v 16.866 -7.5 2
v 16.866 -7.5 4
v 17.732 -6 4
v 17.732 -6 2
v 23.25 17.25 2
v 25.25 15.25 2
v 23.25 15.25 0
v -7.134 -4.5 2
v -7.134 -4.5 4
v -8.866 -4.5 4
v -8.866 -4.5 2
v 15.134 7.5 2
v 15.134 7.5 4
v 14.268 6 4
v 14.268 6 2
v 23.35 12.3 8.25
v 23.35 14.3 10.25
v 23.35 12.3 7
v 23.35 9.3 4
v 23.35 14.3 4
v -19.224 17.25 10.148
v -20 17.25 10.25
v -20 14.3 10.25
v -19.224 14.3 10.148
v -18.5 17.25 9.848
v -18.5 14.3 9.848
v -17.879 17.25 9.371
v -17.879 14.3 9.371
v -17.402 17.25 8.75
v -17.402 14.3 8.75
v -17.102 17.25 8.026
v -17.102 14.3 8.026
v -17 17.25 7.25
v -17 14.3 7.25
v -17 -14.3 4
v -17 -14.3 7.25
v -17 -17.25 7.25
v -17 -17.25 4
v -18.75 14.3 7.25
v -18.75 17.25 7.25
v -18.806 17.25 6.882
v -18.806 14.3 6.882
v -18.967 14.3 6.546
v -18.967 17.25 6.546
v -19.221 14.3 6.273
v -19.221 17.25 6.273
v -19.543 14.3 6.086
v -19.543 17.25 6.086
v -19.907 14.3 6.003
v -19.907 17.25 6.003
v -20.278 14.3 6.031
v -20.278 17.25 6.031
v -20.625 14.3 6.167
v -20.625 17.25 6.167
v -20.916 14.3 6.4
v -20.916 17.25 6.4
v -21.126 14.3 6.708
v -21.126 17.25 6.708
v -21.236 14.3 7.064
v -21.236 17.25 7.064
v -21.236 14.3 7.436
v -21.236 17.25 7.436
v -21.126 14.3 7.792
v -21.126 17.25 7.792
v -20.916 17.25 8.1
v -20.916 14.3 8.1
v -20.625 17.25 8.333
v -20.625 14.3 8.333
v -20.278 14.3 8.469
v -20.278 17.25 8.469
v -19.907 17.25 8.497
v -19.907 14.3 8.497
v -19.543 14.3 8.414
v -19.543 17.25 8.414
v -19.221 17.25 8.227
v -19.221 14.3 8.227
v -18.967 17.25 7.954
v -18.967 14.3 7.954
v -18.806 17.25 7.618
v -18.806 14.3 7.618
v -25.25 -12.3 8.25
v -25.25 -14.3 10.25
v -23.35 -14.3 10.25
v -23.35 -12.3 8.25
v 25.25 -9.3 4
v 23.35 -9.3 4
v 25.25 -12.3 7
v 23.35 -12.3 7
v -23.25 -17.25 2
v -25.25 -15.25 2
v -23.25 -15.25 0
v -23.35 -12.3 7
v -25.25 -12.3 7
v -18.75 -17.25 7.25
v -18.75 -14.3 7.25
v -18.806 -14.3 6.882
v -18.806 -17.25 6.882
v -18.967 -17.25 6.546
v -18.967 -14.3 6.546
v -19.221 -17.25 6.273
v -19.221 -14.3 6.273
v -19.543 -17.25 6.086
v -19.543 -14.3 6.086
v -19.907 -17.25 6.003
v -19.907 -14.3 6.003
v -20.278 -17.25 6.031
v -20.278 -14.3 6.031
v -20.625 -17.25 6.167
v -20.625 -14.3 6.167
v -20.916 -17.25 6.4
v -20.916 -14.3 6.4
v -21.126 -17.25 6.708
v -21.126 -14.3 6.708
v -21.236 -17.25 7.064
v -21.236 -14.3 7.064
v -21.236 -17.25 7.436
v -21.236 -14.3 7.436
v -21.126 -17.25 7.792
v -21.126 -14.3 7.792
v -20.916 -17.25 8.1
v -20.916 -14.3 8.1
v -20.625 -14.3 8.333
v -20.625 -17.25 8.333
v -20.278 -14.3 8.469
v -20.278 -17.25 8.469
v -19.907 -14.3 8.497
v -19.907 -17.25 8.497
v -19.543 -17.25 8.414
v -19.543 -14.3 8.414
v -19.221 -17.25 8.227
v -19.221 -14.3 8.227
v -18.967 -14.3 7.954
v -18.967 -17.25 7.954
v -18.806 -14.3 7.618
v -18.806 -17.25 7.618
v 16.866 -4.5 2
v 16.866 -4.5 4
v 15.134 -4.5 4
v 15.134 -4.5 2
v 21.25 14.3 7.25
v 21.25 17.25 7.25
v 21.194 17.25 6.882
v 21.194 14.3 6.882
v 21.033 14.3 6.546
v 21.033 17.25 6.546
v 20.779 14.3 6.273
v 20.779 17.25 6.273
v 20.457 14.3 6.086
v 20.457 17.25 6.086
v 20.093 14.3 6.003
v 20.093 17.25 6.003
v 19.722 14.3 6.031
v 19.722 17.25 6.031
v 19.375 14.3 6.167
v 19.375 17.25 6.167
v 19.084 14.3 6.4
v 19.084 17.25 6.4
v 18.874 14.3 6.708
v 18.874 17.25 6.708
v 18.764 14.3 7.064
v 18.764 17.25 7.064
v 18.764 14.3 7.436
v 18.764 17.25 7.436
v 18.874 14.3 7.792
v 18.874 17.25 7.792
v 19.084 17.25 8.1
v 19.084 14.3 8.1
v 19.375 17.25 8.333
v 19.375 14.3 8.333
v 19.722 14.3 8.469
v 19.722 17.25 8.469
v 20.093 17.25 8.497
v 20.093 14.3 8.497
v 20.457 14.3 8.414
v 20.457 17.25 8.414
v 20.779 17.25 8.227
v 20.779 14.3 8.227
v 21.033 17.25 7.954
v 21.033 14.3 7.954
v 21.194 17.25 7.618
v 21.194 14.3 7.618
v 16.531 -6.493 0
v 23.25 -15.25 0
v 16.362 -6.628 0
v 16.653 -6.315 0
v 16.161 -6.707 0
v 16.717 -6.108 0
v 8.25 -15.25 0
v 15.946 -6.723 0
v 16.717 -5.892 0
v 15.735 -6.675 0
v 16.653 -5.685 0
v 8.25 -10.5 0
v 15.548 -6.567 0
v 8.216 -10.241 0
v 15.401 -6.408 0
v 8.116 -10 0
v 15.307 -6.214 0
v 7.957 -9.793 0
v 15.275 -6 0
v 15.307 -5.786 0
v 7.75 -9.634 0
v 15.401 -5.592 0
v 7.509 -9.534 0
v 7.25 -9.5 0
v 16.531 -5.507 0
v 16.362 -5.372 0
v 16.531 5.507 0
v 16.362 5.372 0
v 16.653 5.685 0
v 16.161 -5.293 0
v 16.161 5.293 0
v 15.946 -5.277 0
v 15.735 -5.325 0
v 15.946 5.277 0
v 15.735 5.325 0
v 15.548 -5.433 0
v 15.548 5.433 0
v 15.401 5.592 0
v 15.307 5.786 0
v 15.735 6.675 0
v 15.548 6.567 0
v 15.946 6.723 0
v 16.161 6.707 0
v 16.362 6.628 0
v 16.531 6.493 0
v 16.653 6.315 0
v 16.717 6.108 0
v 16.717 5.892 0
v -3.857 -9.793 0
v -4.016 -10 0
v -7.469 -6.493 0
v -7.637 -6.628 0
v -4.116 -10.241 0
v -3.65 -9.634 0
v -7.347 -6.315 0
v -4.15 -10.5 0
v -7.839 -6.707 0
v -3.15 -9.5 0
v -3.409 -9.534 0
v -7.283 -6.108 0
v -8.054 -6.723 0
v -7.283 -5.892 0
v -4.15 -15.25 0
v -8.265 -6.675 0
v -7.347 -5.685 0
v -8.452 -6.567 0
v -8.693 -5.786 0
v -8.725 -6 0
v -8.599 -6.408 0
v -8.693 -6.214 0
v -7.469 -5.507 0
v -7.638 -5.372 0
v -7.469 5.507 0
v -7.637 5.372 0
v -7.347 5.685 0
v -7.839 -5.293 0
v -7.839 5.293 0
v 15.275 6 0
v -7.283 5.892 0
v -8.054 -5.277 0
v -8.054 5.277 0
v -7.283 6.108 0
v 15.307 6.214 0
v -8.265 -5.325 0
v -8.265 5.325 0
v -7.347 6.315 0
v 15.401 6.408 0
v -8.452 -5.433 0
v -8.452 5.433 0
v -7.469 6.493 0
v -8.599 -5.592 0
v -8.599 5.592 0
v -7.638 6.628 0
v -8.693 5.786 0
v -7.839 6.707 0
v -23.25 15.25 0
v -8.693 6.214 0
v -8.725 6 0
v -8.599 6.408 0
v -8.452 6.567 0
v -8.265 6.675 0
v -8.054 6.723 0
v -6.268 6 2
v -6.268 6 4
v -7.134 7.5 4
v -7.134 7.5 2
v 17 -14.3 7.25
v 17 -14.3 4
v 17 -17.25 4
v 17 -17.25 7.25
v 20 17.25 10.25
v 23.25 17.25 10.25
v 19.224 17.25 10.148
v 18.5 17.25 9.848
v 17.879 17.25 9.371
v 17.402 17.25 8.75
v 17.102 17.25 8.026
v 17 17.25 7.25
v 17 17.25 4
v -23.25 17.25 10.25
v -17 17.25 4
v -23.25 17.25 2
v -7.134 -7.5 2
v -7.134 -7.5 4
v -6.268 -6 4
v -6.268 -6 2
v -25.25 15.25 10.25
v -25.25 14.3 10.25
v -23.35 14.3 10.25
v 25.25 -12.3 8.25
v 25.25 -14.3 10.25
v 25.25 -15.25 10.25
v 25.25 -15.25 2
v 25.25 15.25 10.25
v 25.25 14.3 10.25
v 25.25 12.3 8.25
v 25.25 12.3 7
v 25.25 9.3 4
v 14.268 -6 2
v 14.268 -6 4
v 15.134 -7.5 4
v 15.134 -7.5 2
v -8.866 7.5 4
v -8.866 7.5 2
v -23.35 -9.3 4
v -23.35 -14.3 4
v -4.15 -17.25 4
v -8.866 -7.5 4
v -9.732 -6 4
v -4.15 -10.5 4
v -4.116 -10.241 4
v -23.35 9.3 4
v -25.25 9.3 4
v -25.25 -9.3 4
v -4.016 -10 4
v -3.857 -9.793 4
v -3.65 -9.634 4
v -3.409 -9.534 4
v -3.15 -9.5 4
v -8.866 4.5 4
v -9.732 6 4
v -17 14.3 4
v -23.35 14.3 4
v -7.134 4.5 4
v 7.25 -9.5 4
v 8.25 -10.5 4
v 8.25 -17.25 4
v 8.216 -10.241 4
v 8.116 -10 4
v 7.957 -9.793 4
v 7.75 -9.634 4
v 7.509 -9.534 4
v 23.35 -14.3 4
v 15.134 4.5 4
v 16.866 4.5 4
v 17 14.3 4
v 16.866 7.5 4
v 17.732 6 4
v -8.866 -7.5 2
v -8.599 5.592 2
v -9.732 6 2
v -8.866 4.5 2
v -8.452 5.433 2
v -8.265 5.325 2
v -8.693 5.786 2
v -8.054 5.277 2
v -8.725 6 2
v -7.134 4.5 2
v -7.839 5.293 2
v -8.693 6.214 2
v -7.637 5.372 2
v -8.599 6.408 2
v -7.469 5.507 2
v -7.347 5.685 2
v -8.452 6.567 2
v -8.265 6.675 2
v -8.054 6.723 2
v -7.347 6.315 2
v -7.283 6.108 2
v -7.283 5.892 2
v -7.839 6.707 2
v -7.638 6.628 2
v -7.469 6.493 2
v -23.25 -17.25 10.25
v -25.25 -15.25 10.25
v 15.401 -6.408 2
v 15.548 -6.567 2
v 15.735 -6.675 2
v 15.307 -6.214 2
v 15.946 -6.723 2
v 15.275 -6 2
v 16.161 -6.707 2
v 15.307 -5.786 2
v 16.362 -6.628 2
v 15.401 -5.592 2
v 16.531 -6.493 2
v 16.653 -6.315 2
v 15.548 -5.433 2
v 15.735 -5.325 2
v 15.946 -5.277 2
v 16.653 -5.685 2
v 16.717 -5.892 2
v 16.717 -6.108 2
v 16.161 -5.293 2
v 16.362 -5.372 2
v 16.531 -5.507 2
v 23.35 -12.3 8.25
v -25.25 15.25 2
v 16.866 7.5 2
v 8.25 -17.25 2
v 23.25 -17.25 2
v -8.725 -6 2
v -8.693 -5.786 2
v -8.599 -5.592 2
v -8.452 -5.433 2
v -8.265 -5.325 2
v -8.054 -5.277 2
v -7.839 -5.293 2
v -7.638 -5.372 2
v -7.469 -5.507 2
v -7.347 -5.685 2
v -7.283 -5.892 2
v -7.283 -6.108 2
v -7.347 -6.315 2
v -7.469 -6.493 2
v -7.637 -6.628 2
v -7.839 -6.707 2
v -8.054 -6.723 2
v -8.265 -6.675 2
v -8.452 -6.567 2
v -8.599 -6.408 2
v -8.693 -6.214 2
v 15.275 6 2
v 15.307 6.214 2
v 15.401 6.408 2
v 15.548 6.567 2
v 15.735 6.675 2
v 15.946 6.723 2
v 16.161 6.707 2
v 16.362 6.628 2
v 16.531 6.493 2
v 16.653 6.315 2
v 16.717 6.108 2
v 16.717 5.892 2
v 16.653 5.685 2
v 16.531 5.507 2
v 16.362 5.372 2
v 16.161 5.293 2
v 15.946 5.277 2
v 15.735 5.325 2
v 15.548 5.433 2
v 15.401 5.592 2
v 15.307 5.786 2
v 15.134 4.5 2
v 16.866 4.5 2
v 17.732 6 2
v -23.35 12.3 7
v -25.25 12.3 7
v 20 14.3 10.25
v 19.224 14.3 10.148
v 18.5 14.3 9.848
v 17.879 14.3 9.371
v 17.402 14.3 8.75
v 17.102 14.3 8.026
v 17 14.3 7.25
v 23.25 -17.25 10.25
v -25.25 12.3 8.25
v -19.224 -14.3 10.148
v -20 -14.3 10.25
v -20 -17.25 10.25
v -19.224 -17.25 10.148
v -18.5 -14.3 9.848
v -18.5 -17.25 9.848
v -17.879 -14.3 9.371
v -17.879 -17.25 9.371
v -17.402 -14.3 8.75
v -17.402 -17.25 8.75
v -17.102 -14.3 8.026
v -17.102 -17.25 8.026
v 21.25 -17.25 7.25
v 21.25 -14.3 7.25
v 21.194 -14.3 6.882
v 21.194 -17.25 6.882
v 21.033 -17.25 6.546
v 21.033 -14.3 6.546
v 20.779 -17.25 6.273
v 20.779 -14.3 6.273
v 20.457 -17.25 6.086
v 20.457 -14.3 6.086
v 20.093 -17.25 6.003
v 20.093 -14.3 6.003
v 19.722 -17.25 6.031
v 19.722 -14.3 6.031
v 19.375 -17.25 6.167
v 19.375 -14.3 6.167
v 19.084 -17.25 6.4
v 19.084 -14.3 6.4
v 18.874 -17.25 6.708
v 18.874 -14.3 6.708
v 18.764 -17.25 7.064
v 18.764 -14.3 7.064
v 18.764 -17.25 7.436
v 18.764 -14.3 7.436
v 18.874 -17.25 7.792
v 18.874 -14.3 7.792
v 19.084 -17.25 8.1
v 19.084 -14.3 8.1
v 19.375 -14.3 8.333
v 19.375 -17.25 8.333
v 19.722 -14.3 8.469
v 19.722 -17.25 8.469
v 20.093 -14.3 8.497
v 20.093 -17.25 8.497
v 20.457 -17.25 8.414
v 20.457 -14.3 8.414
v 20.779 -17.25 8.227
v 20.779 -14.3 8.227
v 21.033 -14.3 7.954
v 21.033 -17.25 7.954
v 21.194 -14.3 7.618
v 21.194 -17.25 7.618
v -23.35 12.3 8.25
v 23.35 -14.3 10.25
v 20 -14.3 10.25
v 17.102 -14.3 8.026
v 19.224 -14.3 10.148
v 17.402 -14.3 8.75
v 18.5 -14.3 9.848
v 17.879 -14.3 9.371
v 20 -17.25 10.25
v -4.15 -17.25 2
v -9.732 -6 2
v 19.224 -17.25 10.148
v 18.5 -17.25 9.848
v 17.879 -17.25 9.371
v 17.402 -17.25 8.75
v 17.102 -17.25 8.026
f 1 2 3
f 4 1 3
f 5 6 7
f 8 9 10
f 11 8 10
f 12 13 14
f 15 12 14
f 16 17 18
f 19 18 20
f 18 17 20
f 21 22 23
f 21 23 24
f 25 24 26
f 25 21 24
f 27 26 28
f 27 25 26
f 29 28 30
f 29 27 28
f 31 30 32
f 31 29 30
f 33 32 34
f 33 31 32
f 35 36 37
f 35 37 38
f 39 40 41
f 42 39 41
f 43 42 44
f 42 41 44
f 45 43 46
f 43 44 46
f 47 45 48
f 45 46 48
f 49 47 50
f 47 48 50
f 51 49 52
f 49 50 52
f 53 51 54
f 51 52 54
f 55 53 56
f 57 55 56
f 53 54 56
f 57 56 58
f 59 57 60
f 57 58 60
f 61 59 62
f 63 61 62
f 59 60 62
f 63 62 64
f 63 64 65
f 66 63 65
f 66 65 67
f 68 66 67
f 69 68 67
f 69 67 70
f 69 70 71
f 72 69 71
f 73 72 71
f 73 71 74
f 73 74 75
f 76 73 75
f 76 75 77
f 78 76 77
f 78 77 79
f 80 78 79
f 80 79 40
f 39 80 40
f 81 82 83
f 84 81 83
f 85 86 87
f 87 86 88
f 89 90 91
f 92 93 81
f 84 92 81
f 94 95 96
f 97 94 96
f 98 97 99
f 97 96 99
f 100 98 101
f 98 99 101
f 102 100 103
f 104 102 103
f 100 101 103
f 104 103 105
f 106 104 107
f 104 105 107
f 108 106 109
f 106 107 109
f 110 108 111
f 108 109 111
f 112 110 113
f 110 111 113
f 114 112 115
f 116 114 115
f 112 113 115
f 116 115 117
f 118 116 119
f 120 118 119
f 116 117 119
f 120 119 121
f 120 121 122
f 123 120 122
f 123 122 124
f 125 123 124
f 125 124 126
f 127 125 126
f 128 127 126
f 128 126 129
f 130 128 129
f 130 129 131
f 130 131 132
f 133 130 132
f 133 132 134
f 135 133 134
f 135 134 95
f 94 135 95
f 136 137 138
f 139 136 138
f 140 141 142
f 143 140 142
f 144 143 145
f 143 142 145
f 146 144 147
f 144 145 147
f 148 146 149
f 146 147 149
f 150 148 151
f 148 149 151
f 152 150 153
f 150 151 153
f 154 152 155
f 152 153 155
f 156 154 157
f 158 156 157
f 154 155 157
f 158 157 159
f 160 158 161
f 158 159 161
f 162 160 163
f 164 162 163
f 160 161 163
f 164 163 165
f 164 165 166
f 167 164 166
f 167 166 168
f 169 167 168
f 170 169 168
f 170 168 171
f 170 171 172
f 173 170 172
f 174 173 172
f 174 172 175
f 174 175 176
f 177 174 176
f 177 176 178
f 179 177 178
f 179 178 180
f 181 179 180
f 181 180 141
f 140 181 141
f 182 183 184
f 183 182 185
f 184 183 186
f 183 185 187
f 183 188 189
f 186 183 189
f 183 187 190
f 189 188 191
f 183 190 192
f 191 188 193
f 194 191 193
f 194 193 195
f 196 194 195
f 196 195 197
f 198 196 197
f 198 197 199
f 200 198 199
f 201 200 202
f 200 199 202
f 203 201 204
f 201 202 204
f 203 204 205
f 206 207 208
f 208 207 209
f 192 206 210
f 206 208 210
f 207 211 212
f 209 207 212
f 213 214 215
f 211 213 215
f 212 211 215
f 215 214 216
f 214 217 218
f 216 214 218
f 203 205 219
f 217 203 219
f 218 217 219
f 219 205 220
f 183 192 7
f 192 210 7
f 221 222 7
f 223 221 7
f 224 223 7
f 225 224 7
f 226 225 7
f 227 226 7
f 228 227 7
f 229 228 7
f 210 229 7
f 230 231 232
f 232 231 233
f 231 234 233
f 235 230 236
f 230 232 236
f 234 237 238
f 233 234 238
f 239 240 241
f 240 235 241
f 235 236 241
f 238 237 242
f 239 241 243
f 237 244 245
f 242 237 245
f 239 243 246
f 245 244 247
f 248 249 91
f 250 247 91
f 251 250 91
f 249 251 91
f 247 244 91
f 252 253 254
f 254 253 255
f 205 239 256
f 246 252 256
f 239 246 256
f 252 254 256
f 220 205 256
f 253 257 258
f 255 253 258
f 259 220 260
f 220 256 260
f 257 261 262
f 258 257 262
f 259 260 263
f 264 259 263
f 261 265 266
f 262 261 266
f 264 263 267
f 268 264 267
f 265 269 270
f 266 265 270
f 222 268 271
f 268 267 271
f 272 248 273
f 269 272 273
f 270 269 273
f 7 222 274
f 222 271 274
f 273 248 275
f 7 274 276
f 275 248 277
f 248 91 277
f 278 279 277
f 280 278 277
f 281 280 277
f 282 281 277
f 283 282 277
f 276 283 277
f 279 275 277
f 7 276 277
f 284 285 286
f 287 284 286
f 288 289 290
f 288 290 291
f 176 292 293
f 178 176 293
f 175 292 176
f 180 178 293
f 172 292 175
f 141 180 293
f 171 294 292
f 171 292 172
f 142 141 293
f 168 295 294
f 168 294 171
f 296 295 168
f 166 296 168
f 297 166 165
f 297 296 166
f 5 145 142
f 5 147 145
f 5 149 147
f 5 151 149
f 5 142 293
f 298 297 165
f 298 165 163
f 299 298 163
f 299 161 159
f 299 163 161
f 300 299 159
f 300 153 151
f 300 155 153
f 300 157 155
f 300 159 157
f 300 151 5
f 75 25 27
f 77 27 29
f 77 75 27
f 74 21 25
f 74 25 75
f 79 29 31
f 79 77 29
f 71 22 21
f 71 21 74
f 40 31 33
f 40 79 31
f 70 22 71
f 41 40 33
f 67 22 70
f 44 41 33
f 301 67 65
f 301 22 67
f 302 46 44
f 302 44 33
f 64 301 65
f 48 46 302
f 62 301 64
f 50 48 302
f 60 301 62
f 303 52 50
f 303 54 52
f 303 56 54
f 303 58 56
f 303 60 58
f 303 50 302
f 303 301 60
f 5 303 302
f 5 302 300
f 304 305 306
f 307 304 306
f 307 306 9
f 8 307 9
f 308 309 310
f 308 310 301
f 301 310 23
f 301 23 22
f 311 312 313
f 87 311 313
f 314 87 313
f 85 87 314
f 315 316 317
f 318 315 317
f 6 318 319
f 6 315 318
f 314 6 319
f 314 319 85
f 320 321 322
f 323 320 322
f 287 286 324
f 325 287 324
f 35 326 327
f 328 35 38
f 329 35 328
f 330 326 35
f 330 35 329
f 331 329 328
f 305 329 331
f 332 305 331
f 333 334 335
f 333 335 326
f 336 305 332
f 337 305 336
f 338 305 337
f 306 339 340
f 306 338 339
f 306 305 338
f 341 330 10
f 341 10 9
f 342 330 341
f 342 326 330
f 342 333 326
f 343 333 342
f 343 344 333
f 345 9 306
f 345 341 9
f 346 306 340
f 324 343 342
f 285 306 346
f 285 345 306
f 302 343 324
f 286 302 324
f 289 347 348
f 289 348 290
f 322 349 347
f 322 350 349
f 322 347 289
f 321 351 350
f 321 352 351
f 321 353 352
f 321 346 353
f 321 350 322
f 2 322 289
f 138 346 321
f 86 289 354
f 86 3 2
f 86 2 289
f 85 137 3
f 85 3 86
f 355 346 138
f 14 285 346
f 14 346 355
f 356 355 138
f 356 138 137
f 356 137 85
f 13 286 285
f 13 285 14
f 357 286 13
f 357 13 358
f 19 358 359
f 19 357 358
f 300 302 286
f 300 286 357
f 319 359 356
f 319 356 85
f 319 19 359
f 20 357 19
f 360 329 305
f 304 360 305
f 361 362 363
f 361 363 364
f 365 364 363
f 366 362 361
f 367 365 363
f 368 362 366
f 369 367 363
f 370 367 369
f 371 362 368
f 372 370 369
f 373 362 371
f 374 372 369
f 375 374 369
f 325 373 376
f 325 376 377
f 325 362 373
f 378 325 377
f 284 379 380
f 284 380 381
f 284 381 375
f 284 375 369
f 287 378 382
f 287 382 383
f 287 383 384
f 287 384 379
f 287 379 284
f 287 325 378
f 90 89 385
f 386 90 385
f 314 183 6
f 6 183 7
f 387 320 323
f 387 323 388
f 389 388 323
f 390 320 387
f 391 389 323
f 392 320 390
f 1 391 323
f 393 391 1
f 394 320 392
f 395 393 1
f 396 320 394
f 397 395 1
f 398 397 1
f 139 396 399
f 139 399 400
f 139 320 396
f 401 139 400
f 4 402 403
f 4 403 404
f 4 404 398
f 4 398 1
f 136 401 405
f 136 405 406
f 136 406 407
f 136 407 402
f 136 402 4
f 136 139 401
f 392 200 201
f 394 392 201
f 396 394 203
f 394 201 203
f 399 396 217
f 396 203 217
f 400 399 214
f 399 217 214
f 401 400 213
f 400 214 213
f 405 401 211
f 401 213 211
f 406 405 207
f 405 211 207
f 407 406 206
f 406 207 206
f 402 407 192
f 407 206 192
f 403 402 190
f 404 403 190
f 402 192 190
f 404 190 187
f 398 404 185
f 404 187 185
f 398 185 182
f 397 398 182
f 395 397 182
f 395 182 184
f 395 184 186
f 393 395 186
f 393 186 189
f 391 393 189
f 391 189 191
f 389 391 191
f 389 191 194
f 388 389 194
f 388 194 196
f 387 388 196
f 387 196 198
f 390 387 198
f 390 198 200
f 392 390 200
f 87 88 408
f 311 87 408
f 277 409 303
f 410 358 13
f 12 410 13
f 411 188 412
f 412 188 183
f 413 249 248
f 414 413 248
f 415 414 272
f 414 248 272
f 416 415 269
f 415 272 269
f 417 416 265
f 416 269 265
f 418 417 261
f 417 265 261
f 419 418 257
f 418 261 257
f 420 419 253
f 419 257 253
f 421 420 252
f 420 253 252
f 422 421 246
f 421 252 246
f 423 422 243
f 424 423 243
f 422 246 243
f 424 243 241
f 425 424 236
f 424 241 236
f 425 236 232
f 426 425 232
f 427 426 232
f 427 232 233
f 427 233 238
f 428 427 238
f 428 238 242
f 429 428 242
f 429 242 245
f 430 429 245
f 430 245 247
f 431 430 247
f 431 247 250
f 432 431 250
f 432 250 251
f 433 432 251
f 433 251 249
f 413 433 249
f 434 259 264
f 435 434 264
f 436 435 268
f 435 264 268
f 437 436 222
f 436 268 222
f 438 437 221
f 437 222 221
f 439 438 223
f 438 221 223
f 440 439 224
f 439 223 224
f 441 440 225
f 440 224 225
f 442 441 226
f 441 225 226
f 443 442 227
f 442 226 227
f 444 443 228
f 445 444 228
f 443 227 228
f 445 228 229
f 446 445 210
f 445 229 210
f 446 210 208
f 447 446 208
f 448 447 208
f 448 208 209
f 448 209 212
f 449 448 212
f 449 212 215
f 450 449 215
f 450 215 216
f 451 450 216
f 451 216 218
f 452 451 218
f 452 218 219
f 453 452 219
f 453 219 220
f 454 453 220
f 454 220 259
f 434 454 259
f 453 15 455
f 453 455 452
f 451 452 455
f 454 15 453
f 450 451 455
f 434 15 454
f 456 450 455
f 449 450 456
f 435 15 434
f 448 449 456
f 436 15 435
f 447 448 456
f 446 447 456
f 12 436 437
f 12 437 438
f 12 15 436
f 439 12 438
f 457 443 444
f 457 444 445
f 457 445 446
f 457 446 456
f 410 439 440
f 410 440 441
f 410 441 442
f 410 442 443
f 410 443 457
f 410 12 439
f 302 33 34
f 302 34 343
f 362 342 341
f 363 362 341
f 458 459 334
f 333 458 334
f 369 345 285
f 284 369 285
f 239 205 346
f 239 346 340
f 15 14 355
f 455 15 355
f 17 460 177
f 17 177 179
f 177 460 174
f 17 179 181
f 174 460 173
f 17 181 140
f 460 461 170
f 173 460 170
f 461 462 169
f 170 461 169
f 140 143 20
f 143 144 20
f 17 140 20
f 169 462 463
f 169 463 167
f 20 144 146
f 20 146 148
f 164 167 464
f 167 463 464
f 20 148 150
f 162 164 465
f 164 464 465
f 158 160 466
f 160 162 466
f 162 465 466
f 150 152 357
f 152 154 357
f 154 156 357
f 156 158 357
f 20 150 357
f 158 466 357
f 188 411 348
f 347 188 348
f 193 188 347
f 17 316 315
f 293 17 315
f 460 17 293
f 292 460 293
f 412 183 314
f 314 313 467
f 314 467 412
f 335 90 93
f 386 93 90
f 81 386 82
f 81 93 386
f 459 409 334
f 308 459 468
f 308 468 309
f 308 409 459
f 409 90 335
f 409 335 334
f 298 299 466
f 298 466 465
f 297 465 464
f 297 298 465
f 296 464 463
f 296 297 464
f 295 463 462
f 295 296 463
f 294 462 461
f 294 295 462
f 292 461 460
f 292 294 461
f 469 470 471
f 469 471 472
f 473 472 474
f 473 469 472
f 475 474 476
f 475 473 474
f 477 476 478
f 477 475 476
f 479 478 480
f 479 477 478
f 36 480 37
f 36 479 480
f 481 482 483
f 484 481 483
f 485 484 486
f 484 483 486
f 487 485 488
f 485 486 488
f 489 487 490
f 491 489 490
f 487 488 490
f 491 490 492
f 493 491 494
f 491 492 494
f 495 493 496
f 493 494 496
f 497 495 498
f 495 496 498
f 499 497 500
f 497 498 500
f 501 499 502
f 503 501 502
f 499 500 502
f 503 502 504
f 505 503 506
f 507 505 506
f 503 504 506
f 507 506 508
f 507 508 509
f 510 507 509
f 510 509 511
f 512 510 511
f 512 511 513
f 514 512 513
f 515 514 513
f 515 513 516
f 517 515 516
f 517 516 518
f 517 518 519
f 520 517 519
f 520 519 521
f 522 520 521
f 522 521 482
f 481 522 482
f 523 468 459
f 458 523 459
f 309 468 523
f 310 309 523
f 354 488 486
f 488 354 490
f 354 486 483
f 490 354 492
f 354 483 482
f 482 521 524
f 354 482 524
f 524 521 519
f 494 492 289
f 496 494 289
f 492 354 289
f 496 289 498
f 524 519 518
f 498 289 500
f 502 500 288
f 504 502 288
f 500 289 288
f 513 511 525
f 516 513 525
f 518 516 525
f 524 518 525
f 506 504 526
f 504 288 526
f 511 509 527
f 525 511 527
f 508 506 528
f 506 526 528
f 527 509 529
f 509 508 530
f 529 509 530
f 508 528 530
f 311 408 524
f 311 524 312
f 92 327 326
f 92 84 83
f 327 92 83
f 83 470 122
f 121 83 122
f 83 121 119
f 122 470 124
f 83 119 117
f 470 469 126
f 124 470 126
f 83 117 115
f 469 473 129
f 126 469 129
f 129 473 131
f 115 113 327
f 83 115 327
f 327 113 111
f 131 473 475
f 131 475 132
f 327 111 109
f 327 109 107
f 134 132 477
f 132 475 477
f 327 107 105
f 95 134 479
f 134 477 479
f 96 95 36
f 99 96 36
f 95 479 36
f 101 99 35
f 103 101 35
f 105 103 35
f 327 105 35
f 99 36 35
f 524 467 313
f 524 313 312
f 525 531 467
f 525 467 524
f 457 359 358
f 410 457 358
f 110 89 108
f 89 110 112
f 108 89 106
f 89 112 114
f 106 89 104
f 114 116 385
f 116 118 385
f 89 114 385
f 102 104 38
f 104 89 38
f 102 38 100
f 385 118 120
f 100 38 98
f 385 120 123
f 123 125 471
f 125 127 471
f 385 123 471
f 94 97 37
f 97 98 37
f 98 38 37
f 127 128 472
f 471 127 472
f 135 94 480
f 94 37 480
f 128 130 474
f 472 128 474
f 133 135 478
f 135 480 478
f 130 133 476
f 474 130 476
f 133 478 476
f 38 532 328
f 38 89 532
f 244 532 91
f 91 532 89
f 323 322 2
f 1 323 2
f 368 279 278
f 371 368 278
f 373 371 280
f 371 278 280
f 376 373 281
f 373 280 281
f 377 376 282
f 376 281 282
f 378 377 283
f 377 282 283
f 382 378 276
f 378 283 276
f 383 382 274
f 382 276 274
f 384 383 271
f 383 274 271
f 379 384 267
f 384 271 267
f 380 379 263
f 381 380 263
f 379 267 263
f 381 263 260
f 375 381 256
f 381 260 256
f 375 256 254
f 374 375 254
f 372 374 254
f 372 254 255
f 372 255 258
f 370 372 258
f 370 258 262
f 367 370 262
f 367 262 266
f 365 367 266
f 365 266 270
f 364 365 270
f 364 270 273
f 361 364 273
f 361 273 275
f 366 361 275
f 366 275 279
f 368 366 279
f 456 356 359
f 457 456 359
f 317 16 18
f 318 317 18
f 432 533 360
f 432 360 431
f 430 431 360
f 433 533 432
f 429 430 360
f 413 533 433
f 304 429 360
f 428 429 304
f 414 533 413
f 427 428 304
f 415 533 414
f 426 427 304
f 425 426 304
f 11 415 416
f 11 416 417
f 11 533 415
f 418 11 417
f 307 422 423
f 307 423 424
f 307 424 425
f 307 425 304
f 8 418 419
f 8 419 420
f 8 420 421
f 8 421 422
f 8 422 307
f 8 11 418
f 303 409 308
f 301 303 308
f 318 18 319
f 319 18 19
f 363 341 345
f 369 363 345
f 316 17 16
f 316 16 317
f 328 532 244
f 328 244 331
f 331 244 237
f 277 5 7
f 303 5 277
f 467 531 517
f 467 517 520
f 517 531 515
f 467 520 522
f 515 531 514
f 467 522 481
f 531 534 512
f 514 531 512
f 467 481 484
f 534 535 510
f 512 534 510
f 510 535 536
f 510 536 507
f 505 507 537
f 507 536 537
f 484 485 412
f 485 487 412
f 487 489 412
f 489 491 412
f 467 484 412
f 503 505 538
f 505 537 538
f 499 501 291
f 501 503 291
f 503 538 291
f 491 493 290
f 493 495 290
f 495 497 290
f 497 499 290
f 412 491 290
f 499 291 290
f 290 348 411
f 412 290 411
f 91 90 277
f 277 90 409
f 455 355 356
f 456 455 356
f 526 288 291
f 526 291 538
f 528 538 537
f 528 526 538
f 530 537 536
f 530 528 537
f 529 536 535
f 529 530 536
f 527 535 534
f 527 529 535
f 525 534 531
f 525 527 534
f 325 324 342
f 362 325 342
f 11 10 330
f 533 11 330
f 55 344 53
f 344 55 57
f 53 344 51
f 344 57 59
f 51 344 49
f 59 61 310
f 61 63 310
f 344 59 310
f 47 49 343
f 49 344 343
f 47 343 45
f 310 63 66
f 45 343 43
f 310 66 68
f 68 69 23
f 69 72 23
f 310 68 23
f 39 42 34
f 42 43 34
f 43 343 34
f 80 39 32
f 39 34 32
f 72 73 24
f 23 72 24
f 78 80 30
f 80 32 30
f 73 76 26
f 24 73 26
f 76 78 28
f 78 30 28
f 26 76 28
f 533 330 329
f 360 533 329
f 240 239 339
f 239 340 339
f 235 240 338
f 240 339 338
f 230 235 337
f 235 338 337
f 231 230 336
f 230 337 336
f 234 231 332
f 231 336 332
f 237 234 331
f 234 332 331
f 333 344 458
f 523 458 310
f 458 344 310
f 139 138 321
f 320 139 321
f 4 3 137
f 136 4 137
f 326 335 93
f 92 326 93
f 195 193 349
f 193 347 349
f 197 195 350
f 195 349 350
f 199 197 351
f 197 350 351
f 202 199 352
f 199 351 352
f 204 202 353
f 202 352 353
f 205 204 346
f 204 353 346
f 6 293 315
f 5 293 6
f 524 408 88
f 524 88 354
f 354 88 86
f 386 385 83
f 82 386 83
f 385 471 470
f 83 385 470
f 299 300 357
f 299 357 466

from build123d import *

# Parameters (mm, degrees)
SKETCH1_W           = 46.5
SKETCH1_H           = 34.5
BOSS_EXTRUDE1_DEPTH = 4
SKETCH2_W           = 46.5
SKETCH2_H           = 2.95
BOSS_EXTRUDE2_DEPTH = 6.5
SKETCH3_R           = 1.25
CUT_EXTRUDE1_DEPTH  = 35.5
CUT_EXTRUDE8_DEPTH  = 35.5
SKETCH5_R           = 0.725
CUT_EXTRUDE3_DEPTH  = 11.25
SKETCH21_W          = 12.4
SKETCH21_H          = 8.2
CUT_EXTRUDE11_DEPTH = 11.25
BOSS_EXTRUDE3_DEPTH = 0.1
BOSS_EXTRUDE4_DEPTH = 0.1
SKETCH17_W          = 10.25
SKETCH17_H          = 34.5
BOSS_EXTRUDE6_DEPTH = 1.9
SKETCH18_W          = 10.25
SKETCH18_H          = 34.5
BOSS_EXTRUDE7_DEPTH = 1.9
CUT_EXTRUDE10_DEPTH = 51.5
CHAMFER1_SIZE       = 2
FILLET2_R           = 1
CUT_EXTRUDE12_DEPTH = 2


with BuildPart() as part:
    # Sketch1 → Boss-Extrude1 (new body)
    with BuildSketch(Plane.XY):
        Rectangle(SKETCH1_W, SKETCH1_H)
    extrude(amount=BOSS_EXTRUDE1_DEPTH)

    # Sketch2 → Boss-Extrude2 (add)
    with BuildSketch(Plane.XY.offset(4)):
        with Locations((0, 15.775)):
            Rectangle(SKETCH2_W, SKETCH2_H)
        with Locations((0, -15.775)):
            Rectangle(SKETCH2_W, SKETCH2_H)
    extrude(amount=BOSS_EXTRUDE2_DEPTH)

    # Sketch3 → Cut-Extrude1 (cut, through all)
    with BuildSketch(Plane(origin=(0, 17.25, 0), x_dir=(1, 0, 0), z_dir=(0, 1, 0))):
        with Locations((-20, -7.25)):
            Circle(SKETCH3_R)
        with Locations((20, -7.25)):
            Circle(SKETCH3_R)
    extrude(amount=-CUT_EXTRUDE1_DEPTH, mode=Mode.SUBTRACT)

    # Sketch11 → Cut-Extrude8 (cut, through all)
    with BuildSketch(Plane(origin=(0, 17.25, 0), x_dir=(1, 0, 0), z_dir=(0, 1, 0))):
        with BuildLine():
            Line((-17, -7.25), (-17, -4))
            Line((-17, -4), (17, -4))
            Line((17, -4), (17, -7.25))
            ThreePointArc((17, -7.25), (17.878679656, -9.371320344), (20, -10.25))
            Line((20, -10.25), (23.25, -10.25))
            Line((23.25, -10.25), (23.25, -10.5))
            Line((23.25, -10.5), (-23.25, -10.5))
            Line((-23.25, -10.5), (-23.25, -10.25))
            Line((-23.25, -10.25), (-20, -10.25))
            ThreePointArc((-20, -10.25), (-17.878679656, -9.371320344), (-17, -7.25))
        make_face()
    extrude(amount=-CUT_EXTRUDE8_DEPTH, mode=Mode.SUBTRACT)

    # Sketch5 → Cut-Extrude3 (cut, through all)
    with BuildSketch(Plane(origin=(0, 0, 0), x_dir=(-1, 0, 0), z_dir=(0, 0, -1))):
        with Locations((8, 6)):
            Circle(SKETCH5_R)
        with Locations((8, -6)):
            Circle(SKETCH5_R)
        with Locations((-16, -6)):
            Circle(SKETCH5_R)
        with Locations((-16, 6)):
            Circle(SKETCH5_R)
    extrude(amount=-CUT_EXTRUDE3_DEPTH, mode=Mode.SUBTRACT)

    # Sketch21 → Cut-Extrude11 (cut, through all)
    with BuildSketch(Plane(origin=(0, 0, 0), x_dir=(-1, 0, 0), z_dir=(0, 0, -1))):
        with Locations((-2.05, -13.6)):
            Rectangle(SKETCH21_W, SKETCH21_H)
    extrude(amount=-CUT_EXTRUDE11_DEPTH, mode=Mode.SUBTRACT)

    # Sketch14 → Boss-Extrude3 (add)
    with BuildSketch(Plane.ZY.offset(23.25)):
        Polygon((10.25, 17.25), (0, 17.25), (0, -17.25), (10.25, -17.25), (10.25, -14.3), (4, -14.3), (4, 14.3), (10.25, 14.3), align=None)
    extrude(amount=BOSS_EXTRUDE3_DEPTH)

    # Sketch15 → Boss-Extrude4 (add)
    with BuildSketch(Plane(origin=(23.25, 0, 0), x_dir=(0, 0, -1), z_dir=(1, 0, 0))):
        Polygon((-10.25, -17.25), (0, -17.25), (0, 17.25), (-10.25, 17.25), (-10.25, 14.3), (-4, 14.3), (-4, -14.3), (-10.25, -14.3), align=None)
    extrude(amount=BOSS_EXTRUDE4_DEPTH)

    # Sketch17 → Boss-Extrude6 (add)
    with BuildSketch(Plane.ZY.offset(23.35)):
        with Locations((5.125, 0)):
            Rectangle(SKETCH17_W, SKETCH17_H)
    extrude(amount=BOSS_EXTRUDE6_DEPTH)

    # Sketch18 → Boss-Extrude7 (add)
    with BuildSketch(Plane(origin=(23.35, 0, 0), x_dir=(0, 0, -1), z_dir=(1, 0, 0))):
        with Locations((-5.125, 0)):
            Rectangle(SKETCH18_W, SKETCH18_H)
    extrude(amount=BOSS_EXTRUDE7_DEPTH)

    # Sketch19 → Cut-Extrude10 (cut, through all)
    with BuildSketch(Plane.ZY.offset(25.25)):
        Polygon((10.25, 12.3), (7, 12.3), (4, 9.3), (4, -9.3), (7, -12.3), (10.25, -12.3), align=None)
    extrude(amount=-CUT_EXTRUDE10_DEPTH, mode=Mode.SUBTRACT)

    # Chamfer1
    chamfer1_edges = [part.edges().sort_by_distance(p)[0] for p in [
        (16.75, -17.25, 0),
        (-25.25, 0, 0),
        (-25.25, -17.25, 5.125),
        (-25.25, 17.25, 5.125),
        (25.25, 0, 0),
        (25.25, 17.25, 5.125),
        (25.25, -17.25, 5.125),
        (-24.3, 12.3, 10.25),
        (-24.3, -12.3, 10.25),
        (24.3, 12.3, 10.25),
        (24.3, -12.3, 10.25),
        (0, 17.25, 0),
        (-14.7, -17.25, 0),
    ]]
    chamfer(chamfer1_edges, length=CHAMFER1_SIZE)

    # Fillet2
    fillet2_edges = [part.edges().sort_by_distance(p)[0] for p in [
        (-4.15, -9.5, 2),
        (8.25, -9.5, 2),
    ]]
    fillet(fillet2_edges, radius=FILLET2_R)

    # Sketch22 → Cut-Extrude12 (cut)
    with BuildSketch(Plane.XY.offset(4)):
        Polygon((-7.133974596, 4.5), (-6.267949192, 6), (-7.133974596, 7.5), (-8.866025404, 7.5), (-9.732050808, 6), (-8.866025404, 4.5), align=None)
        Polygon((-7.133974596, -7.5), (-6.267949192, -6), (-7.133974596, -4.5), (-8.866025404, -4.5), (-9.732050808, -6), (-8.866025404, -7.5), align=None)
        Polygon((16.866025404, -7.5), (17.732050808, -6), (16.866025404, -4.5), (15.133974596, -4.5), (14.267949192, -6), (15.133974596, -7.5), align=None)
        Polygon((16.866025404, 4.5), (17.732050808, 6), (16.866025404, 7.5), (15.133974596, 7.5), (14.267949192, 6), (15.133974596, 4.5), align=None)
    extrude(amount=-CUT_EXTRUDE12_DEPTH, mode=Mode.SUBTRACT)


solid = part.part
